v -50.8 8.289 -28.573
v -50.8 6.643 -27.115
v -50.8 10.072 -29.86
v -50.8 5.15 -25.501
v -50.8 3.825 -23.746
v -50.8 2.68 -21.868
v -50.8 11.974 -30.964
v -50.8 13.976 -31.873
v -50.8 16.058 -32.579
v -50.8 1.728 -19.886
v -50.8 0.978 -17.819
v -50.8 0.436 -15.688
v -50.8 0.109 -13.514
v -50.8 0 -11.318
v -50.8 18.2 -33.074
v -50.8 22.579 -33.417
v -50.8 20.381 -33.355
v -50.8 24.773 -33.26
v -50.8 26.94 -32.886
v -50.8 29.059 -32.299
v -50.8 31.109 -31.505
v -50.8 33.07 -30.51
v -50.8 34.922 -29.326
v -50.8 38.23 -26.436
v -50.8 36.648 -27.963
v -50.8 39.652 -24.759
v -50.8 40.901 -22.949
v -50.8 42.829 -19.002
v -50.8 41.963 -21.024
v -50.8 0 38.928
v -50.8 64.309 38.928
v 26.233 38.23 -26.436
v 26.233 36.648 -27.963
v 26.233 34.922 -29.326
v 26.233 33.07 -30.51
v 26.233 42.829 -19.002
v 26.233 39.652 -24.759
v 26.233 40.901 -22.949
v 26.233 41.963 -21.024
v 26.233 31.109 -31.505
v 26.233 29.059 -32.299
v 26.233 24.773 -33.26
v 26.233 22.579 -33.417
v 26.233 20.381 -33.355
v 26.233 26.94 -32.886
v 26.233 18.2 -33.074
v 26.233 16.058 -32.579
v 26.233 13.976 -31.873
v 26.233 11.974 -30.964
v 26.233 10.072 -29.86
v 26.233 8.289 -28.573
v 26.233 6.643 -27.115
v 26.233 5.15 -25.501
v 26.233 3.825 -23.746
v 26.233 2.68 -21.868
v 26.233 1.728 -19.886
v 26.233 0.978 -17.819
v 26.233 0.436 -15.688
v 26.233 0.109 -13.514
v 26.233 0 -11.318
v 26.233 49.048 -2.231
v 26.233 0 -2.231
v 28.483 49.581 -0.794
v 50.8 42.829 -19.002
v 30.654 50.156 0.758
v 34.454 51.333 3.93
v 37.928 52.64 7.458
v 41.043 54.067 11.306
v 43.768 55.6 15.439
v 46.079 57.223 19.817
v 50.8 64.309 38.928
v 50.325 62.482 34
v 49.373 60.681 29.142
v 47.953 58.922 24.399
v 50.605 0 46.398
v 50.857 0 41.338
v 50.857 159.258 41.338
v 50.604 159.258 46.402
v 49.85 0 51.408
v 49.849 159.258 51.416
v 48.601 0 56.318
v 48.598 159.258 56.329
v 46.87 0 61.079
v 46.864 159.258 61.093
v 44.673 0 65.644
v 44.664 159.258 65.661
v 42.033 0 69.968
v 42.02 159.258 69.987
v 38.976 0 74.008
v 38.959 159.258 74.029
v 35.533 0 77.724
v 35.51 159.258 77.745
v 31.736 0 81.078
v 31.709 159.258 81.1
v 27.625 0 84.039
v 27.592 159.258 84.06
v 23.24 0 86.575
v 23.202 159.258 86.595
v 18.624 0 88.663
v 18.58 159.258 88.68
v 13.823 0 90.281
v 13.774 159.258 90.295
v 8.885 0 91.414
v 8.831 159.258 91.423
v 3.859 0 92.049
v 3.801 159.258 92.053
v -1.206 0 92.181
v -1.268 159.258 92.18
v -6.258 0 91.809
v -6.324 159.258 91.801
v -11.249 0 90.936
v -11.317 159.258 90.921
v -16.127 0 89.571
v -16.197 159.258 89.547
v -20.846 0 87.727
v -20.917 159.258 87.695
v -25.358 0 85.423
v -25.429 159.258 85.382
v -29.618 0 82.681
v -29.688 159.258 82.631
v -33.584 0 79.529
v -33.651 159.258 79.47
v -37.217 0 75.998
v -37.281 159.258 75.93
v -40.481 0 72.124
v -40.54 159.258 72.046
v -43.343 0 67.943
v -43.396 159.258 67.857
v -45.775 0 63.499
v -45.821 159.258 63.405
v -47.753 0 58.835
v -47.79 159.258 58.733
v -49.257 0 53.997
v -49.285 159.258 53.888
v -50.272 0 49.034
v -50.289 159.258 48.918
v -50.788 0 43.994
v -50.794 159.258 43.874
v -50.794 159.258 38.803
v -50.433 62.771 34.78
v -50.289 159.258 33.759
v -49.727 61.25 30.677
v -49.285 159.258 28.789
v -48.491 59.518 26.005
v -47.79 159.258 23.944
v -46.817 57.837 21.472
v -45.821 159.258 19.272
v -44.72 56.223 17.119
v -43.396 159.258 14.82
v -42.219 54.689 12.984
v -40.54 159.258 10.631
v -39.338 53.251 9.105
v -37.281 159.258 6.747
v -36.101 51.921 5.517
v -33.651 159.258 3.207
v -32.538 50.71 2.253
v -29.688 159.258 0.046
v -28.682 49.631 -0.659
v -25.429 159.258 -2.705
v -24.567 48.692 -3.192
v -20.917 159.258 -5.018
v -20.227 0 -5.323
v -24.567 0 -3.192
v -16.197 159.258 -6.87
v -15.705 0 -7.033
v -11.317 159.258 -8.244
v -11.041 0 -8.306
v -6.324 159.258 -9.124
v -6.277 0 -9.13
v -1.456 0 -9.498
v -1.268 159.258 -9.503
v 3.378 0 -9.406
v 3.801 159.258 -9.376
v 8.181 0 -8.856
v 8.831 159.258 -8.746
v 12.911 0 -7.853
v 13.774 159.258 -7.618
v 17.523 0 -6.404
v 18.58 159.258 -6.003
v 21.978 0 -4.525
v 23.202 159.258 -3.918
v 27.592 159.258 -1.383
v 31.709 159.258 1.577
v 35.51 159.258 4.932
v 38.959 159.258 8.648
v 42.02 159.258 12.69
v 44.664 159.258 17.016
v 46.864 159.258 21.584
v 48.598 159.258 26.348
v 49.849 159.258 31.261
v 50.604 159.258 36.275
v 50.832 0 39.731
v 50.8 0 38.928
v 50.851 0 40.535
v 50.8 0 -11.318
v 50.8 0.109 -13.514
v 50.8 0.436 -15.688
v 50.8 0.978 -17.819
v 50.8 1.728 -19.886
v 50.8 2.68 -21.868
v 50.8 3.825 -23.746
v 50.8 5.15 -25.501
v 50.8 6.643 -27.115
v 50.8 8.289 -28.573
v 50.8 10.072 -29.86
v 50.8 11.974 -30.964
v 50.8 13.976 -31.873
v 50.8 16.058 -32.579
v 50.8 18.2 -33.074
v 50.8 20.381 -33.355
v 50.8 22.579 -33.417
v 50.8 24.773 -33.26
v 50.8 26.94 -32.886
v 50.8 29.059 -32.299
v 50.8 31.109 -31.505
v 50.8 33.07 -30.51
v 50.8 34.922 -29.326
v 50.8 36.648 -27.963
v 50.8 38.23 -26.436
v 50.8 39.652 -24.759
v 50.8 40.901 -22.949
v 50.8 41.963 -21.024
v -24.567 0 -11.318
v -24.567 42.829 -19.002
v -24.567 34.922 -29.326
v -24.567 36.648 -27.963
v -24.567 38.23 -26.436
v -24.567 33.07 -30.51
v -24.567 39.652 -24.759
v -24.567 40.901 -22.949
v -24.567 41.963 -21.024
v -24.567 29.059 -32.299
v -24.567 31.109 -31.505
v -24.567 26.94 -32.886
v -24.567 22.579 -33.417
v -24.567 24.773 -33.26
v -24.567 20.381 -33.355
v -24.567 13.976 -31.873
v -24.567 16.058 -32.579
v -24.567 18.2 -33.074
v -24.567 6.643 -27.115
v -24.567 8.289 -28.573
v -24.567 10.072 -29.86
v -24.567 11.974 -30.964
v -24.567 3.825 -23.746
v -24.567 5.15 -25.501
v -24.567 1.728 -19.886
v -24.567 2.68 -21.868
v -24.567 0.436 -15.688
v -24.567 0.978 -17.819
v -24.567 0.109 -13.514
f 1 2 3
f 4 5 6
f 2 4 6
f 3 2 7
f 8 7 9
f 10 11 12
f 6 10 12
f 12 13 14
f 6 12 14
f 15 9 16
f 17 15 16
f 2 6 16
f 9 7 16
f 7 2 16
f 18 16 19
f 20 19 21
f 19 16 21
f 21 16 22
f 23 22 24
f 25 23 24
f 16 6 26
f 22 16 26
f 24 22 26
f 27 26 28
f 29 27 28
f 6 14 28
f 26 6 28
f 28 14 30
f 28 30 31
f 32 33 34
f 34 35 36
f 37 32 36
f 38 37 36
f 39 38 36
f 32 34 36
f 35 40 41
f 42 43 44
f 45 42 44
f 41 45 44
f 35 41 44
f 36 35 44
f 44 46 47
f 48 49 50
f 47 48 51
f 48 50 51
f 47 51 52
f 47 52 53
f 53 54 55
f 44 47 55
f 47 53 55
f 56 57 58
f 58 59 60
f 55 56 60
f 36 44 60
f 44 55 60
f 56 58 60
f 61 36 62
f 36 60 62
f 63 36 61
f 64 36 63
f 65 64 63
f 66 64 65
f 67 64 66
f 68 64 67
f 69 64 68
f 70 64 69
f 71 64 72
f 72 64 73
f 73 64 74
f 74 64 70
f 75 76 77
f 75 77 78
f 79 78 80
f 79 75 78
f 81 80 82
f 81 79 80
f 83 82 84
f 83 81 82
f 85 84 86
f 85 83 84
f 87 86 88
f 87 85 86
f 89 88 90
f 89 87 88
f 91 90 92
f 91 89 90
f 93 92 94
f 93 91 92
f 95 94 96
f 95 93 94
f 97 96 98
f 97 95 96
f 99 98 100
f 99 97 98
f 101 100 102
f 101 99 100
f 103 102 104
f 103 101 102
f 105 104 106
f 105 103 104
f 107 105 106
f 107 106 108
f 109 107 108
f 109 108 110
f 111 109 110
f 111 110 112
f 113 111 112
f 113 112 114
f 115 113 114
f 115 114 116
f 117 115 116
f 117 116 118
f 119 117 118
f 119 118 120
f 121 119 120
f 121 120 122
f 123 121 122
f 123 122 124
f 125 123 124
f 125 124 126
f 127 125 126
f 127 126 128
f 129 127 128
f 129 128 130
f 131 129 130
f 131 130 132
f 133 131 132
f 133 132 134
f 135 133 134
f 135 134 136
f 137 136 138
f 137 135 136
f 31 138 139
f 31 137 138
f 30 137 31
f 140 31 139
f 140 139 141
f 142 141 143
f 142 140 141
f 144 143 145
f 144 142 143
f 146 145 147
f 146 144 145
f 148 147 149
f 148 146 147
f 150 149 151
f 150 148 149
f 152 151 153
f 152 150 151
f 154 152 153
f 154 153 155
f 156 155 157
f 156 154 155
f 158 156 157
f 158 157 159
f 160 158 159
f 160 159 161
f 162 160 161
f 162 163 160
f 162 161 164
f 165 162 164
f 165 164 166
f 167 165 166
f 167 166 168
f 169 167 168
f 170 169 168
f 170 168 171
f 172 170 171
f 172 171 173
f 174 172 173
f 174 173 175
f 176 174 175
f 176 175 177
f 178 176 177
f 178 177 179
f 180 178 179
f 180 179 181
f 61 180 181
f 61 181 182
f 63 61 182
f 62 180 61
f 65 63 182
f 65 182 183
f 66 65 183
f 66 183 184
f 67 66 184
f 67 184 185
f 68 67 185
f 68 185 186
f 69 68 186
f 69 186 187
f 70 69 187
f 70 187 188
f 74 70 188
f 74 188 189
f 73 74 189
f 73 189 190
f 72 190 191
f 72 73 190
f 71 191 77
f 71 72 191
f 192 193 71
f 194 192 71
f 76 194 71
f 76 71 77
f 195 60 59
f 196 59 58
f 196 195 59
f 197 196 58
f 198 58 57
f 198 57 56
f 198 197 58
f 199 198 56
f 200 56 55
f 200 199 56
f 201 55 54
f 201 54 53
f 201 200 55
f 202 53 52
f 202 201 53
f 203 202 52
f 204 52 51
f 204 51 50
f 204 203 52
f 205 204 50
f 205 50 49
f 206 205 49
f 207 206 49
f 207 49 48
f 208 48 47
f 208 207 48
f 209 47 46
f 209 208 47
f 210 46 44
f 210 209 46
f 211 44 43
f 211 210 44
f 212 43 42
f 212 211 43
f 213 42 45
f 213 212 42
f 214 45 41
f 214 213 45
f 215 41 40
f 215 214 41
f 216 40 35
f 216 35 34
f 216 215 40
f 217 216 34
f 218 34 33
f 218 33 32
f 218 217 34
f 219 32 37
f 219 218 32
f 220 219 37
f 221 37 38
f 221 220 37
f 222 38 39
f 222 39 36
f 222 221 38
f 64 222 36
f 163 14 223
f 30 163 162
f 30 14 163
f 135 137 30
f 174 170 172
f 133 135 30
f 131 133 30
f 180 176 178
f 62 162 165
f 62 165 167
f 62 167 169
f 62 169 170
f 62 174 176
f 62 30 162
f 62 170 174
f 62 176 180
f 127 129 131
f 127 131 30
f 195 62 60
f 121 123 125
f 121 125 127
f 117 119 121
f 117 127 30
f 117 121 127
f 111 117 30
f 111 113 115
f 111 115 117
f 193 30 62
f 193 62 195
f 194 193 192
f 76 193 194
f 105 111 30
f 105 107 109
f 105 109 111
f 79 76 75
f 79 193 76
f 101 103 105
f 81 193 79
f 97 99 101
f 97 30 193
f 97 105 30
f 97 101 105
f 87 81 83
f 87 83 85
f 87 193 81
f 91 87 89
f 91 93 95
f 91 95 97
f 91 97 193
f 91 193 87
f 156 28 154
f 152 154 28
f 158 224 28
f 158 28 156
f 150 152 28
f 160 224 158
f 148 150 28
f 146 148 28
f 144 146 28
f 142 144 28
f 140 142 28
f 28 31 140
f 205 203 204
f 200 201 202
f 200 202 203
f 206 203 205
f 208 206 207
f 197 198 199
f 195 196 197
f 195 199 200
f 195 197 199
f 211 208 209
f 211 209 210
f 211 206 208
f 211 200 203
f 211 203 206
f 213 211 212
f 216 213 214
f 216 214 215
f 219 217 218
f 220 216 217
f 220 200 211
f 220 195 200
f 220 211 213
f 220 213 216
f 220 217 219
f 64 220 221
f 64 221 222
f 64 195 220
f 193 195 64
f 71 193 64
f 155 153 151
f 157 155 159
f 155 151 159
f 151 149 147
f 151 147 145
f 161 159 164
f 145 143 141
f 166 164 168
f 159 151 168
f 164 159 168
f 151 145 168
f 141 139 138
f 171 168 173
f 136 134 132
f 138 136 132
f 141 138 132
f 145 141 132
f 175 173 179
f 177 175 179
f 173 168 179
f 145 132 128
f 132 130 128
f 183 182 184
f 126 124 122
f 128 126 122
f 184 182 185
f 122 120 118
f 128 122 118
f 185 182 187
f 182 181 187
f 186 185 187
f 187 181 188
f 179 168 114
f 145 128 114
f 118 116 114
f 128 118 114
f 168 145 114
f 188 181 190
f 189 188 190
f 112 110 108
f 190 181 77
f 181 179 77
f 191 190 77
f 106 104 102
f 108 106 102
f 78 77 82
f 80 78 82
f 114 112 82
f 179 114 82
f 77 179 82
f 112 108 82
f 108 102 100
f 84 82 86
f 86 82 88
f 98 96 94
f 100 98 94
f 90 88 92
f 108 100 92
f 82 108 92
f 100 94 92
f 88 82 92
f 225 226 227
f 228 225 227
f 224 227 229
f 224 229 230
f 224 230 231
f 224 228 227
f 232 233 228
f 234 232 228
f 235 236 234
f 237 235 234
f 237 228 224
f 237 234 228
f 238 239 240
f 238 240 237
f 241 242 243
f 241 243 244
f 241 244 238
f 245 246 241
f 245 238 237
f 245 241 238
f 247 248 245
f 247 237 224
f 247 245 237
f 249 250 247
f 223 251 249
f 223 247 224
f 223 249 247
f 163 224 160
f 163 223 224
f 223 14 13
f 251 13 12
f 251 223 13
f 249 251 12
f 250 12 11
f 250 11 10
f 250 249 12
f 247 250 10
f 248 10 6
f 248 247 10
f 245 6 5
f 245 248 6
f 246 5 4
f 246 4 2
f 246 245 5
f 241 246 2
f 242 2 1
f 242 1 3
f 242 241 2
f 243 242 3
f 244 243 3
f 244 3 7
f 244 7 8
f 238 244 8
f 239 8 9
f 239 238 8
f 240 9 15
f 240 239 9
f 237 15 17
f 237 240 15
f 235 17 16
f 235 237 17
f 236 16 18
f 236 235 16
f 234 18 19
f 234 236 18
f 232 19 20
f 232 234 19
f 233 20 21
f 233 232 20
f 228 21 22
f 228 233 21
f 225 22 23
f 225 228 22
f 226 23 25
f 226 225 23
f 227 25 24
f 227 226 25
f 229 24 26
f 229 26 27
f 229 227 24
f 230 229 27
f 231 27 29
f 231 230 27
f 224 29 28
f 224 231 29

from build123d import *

# Parameters (mm, degrees)
F1_DEPTH = 50.8
F2_W     = 50.8
F2_H     = 74.168
F3_DEPTH = 170.688
F4_R     = 50.8571740797
F5_DEPTH = 159.258


with BuildPart() as f1:
    # F0 (on Right) → F1 (new body, symmetric)
    with BuildSketch(Plane.YZ):
        with BuildLine():
            Line((0, 40.3383746743), (0, -11.3177125019))
            ThreePointArc((0, -11.3177125019), (18.2004266595, -33.0743933699), (42.8294130616, -19.0023742616))
            Line((42.8294130616, -19.0023742616), (64.8321659319, 40.3383746743))
            Line((64.8321659319, 40.3383746743), (0, 40.3383746743))
        make_face()
    extrude(amount=F1_DEPTH, both=True)

    # F2 (on Front) → F3 (cut)
    with BuildSketch(Plane.XZ):
        with Locations((0.8334377781, 3.3744326594)):
            Rectangle(F2_W, F2_H)
    extrude(amount=-F3_DEPTH, mode=Mode.SUBTRACT)

    # F4 (on Front) → F5 (join)
    with BuildSketch(Plane.XZ):
        with Locations((0, 41.3384996355)):
            Circle(F4_R)
    extrude(amount=-F5_DEPTH)


solid = f1.part
